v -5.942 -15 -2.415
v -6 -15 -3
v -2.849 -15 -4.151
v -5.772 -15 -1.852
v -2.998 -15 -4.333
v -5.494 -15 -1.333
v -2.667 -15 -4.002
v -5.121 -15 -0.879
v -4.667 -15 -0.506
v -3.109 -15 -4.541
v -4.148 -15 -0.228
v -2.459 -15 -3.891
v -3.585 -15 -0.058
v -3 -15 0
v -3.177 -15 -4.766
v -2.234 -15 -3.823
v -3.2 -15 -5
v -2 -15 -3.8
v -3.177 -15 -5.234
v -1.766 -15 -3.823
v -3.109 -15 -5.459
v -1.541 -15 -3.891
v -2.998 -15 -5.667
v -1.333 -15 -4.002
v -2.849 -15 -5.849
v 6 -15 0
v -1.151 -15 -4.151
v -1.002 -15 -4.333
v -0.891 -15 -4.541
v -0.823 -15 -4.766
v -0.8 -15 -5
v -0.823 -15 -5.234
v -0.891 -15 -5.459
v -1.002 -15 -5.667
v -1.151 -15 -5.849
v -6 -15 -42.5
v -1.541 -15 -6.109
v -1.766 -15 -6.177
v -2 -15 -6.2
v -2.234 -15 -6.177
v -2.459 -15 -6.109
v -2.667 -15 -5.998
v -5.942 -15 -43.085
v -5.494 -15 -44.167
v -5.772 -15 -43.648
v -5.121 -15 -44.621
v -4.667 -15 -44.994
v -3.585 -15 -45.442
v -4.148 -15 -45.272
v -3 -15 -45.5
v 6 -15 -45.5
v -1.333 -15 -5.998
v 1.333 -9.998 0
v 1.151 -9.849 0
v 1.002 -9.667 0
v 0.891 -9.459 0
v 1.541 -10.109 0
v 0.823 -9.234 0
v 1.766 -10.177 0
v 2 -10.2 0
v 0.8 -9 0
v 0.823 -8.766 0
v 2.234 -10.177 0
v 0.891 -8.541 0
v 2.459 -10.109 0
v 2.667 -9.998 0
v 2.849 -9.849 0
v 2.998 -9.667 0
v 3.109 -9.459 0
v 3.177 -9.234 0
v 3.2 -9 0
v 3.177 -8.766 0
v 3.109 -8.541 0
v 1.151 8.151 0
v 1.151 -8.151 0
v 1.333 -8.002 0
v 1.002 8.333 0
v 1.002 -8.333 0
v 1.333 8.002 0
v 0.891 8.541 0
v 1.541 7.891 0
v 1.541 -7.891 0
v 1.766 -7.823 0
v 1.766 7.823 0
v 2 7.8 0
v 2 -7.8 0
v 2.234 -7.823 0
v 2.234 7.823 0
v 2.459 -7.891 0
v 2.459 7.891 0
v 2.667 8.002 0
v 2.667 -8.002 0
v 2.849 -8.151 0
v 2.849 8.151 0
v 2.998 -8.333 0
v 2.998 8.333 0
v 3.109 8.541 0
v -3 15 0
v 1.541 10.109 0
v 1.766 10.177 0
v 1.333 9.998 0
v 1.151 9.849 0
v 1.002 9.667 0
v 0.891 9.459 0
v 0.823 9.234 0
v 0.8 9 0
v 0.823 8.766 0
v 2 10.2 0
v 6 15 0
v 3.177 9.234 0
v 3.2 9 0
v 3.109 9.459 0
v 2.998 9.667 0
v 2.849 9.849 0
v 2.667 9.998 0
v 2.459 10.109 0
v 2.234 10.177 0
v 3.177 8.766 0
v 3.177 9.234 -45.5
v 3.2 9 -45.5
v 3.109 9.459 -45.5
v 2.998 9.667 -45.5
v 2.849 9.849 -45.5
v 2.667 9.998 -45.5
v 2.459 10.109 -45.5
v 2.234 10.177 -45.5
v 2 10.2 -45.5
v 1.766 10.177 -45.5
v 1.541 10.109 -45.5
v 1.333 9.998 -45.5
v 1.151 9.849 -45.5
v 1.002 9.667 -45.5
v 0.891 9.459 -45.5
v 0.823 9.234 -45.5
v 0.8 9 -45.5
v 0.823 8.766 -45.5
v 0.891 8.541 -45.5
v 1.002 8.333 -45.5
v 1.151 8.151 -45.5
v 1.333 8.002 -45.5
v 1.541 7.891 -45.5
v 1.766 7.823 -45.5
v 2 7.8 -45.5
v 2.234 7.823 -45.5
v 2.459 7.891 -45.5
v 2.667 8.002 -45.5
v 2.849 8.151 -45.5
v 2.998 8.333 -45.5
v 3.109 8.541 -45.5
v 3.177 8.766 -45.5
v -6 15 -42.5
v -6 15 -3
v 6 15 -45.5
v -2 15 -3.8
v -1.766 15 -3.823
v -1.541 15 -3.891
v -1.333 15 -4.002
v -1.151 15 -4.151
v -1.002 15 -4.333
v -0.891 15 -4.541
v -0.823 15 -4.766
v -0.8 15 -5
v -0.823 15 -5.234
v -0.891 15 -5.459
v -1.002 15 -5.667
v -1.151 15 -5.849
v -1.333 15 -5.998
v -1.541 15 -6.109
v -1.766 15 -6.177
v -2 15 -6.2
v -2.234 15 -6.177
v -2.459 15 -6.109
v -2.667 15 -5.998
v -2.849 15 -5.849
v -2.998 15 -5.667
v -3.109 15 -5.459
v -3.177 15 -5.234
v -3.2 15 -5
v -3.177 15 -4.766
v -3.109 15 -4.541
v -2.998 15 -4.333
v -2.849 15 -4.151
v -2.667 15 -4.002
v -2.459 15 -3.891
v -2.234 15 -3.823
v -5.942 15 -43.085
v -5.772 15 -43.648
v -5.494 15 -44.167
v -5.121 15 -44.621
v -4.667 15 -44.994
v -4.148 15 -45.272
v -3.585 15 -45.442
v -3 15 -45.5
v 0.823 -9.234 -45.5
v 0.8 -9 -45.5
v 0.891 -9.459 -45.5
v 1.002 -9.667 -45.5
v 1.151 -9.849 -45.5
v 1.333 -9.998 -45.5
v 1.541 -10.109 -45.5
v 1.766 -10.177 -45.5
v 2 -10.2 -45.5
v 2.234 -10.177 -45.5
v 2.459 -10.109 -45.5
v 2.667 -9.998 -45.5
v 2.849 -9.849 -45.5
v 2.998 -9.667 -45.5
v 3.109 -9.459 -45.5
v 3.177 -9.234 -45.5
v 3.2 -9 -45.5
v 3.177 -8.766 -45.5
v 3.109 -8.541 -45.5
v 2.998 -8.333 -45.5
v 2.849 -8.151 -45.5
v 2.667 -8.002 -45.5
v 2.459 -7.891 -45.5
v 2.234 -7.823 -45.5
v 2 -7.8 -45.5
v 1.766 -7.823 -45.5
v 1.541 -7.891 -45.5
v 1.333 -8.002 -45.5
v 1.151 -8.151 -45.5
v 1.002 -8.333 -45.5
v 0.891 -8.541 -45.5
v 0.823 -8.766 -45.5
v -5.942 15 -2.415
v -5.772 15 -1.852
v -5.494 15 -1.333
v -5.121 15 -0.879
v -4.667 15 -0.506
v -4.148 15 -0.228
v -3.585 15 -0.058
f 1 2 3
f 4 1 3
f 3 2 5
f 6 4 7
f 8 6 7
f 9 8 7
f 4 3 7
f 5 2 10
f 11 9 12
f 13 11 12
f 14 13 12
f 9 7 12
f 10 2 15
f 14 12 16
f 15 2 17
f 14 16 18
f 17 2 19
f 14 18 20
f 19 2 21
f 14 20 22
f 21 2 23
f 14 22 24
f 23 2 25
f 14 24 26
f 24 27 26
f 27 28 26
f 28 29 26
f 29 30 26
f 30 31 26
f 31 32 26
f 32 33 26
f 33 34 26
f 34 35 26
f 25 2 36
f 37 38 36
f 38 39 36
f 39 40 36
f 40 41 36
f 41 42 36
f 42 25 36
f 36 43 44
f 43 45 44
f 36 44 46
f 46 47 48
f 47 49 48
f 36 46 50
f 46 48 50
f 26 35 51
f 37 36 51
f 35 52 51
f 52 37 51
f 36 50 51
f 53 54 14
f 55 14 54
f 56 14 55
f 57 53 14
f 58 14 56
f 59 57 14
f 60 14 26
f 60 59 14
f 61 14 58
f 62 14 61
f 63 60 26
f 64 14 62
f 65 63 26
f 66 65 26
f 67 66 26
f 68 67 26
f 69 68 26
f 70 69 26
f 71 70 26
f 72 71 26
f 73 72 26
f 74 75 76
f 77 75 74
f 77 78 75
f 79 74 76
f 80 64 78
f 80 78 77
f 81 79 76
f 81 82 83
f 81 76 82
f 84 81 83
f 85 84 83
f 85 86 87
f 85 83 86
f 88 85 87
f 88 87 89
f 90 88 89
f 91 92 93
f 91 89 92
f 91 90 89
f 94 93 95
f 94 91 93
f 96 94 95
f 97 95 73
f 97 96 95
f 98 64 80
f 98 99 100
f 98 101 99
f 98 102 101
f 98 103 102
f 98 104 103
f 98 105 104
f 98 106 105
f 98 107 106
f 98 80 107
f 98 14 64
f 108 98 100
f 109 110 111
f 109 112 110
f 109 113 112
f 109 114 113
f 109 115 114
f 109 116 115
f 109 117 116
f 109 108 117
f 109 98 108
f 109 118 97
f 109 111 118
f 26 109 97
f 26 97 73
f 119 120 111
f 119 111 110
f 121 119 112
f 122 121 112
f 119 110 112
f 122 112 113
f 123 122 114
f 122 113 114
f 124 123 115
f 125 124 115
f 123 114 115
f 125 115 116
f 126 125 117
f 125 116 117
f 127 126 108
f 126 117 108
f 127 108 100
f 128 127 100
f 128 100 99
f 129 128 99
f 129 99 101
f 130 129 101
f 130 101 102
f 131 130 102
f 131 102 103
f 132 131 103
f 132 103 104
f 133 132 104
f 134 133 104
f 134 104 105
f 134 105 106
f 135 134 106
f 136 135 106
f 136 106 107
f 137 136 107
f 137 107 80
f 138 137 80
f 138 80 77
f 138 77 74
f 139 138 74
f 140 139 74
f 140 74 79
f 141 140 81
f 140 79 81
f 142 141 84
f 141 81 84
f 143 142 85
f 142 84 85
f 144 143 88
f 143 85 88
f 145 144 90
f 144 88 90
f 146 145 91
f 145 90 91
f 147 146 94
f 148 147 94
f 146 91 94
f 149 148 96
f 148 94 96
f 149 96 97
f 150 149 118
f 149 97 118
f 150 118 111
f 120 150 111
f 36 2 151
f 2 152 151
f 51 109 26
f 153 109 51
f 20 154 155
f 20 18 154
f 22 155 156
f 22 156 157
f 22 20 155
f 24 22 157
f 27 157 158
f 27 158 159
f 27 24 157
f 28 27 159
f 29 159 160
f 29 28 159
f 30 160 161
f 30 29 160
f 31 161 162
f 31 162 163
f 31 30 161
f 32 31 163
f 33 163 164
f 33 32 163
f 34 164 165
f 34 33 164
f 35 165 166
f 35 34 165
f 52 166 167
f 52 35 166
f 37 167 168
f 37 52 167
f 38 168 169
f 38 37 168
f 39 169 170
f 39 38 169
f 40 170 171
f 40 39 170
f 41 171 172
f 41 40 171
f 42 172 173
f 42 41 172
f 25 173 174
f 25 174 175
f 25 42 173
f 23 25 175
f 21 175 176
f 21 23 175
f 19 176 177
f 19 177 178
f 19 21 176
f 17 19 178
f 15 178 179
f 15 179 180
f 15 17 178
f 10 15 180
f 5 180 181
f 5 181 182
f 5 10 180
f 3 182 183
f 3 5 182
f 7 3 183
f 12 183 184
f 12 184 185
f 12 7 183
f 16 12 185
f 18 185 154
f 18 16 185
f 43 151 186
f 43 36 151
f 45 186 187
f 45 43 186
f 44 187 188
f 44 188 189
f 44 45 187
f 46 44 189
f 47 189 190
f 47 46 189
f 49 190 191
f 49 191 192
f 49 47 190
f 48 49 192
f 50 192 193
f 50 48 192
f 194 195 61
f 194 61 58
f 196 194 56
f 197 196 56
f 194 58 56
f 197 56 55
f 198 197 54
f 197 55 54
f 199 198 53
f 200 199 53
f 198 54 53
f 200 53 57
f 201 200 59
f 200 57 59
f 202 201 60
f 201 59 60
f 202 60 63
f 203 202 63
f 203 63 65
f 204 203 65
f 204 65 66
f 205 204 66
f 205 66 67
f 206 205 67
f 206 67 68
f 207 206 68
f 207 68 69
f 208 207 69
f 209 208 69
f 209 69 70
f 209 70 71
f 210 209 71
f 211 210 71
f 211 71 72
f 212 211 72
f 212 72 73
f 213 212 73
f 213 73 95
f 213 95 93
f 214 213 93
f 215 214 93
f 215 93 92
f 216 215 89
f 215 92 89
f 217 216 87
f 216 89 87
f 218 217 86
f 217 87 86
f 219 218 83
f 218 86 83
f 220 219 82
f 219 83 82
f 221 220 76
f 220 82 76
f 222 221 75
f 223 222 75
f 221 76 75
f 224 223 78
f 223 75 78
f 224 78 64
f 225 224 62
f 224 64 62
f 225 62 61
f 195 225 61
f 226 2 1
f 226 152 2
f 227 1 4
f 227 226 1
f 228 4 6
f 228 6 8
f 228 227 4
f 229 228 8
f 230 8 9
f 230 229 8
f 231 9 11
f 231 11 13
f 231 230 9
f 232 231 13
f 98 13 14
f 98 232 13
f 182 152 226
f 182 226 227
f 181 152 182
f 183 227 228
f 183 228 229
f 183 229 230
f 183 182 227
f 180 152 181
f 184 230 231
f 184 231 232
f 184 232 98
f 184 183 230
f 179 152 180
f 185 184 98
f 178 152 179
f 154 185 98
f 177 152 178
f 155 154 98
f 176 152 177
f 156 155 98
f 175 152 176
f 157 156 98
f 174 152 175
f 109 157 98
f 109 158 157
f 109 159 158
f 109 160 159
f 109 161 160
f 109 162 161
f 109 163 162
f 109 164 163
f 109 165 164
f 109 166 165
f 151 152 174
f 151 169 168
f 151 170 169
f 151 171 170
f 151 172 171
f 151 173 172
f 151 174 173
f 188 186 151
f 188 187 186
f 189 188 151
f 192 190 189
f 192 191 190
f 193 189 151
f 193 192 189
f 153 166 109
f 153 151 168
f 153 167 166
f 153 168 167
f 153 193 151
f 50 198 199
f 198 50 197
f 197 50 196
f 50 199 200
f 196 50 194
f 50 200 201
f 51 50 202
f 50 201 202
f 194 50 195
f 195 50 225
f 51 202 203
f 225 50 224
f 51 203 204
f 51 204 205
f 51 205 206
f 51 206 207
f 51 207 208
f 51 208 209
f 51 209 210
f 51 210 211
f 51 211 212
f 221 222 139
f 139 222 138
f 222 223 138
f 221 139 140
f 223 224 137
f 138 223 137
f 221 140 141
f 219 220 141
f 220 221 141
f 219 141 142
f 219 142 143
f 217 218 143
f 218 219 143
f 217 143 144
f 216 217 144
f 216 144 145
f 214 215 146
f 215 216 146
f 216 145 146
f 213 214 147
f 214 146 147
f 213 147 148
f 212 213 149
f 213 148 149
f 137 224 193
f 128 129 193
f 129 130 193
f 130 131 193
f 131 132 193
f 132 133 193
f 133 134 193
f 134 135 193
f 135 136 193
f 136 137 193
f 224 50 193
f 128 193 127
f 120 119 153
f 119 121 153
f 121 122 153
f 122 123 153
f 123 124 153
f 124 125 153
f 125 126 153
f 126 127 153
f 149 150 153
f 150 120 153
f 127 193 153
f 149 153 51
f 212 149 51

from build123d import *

# Parameters (mm, degrees)
ESQUISSE1_W             = 12
ESQUISSE1_H             = 45.5
ESQUISSE1_R             = 1.2
BOSS_EXTRU_1_DEPTH      = 15
ESQUISSE2_R             = 1.2
ENL_V_MAT_EXTRU_1_DEPTH = 49.28301979
CONG_1_R                = 3


with BuildPart() as part:
    # Esquisse1 → Boss.-Extru.1 (new, symmetric)
    with BuildSketch(Plane(origin=(0, 0, 0), x_dir=(1, 0, 0), z_dir=(0, 1, 0))):
        with Locations((0, 22.75)):
            Rectangle(ESQUISSE1_W, ESQUISSE1_H)
        with Locations(Location((-2, 5, 0), (0, 0, 270))):
            Circle(ESQUISSE1_R, mode=Mode.SUBTRACT)
    extrude(amount=BOSS_EXTRU_1_DEPTH, both=True)

    # Esquisse2 → Enlèv. mat.-Extru.1 (cut, through all)
    with BuildSketch(Plane.XY):
        with Locations((2, 9)):
            Circle(ESQUISSE2_R)
        with Locations(Location((2, -9, 0), (0, 0, 180))):
            Circle(ESQUISSE2_R)
    extrude(amount=-ENL_V_MAT_EXTRU_1_DEPTH, mode=Mode.SUBTRACT)

    # Congé1
    cong_1_edges = [part.edges().sort_by_distance(p)[0] for p in [
        (-6, 0, -45.5),
        (-6, 0, 0),
    ]]
    fillet(cong_1_edges, radius=CONG_1_R)


solid = part.part
